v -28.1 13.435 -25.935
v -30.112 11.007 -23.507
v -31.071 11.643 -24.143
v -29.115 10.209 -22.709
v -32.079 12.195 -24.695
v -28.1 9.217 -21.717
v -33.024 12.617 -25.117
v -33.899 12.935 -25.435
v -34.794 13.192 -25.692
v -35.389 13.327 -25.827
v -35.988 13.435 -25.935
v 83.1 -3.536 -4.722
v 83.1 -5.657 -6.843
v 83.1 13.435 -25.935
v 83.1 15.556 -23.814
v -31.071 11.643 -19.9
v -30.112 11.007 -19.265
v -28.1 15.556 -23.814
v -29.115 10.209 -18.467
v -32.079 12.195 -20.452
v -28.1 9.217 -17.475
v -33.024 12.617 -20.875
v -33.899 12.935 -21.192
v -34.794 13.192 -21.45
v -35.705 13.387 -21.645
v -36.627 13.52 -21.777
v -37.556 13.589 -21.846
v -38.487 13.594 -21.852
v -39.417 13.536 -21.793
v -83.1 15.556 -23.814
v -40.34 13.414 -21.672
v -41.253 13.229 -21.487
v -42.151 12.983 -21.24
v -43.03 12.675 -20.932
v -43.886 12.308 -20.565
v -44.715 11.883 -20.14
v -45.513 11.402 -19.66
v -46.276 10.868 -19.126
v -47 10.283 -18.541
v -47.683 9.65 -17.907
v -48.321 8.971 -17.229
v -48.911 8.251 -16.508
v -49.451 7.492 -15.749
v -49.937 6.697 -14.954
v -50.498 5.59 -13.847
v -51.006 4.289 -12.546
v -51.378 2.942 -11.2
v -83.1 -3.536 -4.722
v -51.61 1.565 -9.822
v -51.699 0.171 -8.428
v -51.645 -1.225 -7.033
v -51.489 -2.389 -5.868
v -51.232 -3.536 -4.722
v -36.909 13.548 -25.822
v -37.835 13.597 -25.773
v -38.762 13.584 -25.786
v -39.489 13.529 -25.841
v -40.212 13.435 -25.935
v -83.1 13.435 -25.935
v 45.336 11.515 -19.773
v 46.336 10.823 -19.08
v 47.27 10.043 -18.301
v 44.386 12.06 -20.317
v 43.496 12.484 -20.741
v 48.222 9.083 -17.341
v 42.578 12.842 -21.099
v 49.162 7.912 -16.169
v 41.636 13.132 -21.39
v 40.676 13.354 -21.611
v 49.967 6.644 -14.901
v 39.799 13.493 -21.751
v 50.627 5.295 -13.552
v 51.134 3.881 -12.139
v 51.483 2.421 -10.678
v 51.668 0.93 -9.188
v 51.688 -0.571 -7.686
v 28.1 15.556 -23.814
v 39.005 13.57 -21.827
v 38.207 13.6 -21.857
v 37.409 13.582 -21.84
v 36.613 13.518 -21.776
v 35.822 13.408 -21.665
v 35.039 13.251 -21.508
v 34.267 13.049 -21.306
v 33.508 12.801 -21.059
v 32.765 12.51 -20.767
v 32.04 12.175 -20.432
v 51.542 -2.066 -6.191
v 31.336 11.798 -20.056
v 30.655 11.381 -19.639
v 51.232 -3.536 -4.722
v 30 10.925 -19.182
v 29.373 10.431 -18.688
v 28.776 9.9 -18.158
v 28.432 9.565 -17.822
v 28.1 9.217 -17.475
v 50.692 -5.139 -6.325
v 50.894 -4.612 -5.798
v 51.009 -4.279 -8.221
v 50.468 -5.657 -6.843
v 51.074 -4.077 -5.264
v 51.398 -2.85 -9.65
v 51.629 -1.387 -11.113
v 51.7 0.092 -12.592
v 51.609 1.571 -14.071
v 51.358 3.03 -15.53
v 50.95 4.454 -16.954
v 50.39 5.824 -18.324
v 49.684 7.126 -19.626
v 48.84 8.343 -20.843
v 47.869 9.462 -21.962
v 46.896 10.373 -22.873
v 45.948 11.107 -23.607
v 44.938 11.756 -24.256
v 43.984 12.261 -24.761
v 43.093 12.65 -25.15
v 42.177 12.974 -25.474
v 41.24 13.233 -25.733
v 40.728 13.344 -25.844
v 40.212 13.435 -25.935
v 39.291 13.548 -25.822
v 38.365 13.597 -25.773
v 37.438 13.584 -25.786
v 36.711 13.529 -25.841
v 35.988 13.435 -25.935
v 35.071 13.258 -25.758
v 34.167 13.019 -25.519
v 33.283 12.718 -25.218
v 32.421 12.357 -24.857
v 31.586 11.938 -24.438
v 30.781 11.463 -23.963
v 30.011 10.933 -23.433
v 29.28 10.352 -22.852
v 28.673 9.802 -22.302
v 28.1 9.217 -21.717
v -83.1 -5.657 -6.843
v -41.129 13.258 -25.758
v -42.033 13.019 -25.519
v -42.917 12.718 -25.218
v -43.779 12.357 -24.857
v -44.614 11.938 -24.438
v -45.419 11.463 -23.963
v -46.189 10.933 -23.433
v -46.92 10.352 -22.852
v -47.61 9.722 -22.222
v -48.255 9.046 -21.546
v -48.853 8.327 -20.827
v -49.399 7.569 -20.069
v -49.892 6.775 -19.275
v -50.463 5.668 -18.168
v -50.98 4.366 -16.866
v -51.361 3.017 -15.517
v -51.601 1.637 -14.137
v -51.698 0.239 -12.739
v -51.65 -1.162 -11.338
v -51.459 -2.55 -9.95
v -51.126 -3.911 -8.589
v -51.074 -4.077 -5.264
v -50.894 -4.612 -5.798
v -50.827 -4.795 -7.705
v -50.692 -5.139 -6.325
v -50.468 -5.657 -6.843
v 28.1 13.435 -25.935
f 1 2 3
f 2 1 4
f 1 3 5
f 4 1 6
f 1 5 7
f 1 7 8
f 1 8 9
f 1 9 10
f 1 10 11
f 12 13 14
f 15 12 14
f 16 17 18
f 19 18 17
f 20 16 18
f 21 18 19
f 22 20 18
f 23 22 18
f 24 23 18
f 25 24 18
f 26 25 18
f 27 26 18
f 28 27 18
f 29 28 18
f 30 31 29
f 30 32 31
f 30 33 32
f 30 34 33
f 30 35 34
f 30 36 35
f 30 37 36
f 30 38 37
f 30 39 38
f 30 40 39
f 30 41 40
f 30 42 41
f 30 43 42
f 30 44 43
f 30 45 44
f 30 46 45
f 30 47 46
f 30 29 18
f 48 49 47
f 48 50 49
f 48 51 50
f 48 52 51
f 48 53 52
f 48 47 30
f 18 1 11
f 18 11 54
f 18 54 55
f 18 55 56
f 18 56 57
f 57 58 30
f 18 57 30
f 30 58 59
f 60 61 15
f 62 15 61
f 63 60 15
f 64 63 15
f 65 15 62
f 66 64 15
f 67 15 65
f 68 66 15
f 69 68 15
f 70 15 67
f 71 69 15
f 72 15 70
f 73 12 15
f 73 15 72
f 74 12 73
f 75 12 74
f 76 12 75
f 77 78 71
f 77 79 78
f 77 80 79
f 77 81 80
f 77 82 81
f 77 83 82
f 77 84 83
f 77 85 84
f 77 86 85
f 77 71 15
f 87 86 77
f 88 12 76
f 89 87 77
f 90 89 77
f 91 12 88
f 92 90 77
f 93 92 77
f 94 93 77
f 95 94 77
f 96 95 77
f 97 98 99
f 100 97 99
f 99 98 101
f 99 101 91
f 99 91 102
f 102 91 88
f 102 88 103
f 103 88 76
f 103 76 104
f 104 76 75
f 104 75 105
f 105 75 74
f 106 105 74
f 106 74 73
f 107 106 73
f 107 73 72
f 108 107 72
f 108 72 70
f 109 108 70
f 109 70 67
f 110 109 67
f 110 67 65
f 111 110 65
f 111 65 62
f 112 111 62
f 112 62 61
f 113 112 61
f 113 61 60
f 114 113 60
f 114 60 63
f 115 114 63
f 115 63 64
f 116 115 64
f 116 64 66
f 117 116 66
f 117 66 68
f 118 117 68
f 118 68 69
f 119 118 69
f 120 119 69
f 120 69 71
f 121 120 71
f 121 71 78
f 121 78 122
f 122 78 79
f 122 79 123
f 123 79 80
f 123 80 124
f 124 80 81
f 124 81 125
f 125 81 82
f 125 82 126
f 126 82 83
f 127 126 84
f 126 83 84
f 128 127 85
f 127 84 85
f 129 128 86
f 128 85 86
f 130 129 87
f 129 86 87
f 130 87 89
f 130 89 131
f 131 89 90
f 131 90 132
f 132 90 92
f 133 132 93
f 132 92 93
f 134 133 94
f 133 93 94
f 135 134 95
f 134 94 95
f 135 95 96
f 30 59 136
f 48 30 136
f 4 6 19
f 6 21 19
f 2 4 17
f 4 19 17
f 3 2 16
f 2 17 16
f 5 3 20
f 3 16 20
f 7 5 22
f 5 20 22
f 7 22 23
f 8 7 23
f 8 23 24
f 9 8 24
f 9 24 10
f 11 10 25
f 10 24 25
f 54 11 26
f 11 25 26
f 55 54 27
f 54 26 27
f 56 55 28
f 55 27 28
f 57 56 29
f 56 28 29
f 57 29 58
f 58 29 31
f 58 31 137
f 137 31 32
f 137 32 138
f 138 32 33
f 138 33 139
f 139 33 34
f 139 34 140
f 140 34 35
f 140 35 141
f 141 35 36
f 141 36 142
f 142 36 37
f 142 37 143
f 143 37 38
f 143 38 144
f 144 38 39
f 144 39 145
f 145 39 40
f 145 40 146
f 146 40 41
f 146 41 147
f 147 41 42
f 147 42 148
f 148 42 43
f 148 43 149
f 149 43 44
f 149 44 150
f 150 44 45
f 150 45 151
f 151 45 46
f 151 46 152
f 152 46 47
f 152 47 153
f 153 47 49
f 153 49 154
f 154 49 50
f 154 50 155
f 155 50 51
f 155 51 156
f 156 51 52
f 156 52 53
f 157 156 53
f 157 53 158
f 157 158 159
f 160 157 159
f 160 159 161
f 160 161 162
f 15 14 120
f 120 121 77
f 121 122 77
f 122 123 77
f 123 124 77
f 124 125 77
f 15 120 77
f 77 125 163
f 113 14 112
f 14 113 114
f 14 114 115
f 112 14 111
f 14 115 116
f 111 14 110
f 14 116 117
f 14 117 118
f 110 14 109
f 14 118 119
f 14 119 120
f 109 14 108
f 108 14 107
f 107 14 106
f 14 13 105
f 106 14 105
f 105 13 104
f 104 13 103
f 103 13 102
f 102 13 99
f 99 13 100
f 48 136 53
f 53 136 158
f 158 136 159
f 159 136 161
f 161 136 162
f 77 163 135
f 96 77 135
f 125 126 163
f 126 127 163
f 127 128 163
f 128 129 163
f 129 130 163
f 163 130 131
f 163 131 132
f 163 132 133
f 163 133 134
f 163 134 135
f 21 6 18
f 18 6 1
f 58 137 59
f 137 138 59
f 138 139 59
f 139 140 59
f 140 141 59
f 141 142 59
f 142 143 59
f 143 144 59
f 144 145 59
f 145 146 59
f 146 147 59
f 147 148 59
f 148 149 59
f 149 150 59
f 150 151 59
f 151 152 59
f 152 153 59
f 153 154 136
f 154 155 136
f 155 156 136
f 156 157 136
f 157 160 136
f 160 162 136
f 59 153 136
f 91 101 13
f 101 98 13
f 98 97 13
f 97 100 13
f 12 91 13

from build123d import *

# Parameters (mm, degrees)
F4_W     = 10
F4_H     = 8
F5_DEPTH = 3
F3_R     = 13.6
F6_DEPTH = 26


with BuildPart() as f5:
    # F4 (on face) → F5 (new body)
    with BuildSketch(Plane(origin=(0, -6.25, -6.25), x_dir=(-1, 0, 0), z_dir=(0, 0.7071067812, 0.7071067812))):
        Polygon((38.1, -0.8388347648), (38.1, -8.8388347648), (28.1, -8.8388347648), (28.1, -27.8388347648), (83.1, -27.8388347648), (83.1, -0.8388347648), align=None)
        with Locations((33.1, -4.8388347648)):
            Rectangle(F4_W, F4_H)
    extrude(amount=F5_DEPTH)


with BuildPart() as f5b:
    # F4 (on face) → F5, piece 2 (new body)
    with BuildSketch(Plane(origin=(0, -6.25, -6.25), x_dir=(-1, 0, 0), z_dir=(0, 0.7071067812, 0.7071067812))):
        Polygon((-28.1, -27.8388347648), (-28.1, -8.8388347648), (-38.1, -8.8388347648), (-38.1, -0.8388347648), (-83.1, -0.8388347648), (-83.1, -27.8388347648), align=None)
        with Locations((-33.1, -4.8388347648)):
            Rectangle(F4_W, F4_H)
    extrude(amount=F5_DEPTH)


with BuildPart() as f6_tool:
    # F3 (on Top) → F6 (new body)
    with BuildSketch(Plane.XY):
        with Locations((-38.1, 0)):
            Circle(F3_R)
        with BuildLine():
            ThreePointArc((51.7, 0), (38.1, 13.6), (24.5, 0))
            ThreePointArc((24.5, 0), (38.1, -13.6), (51.7, 0))
        make_face()
    extrude(amount=-F6_DEPTH)


with BuildPart() as f5_1:
    add(f5.part)

    # F6: cut by f6_tool
    add(f6_tool.part, mode=Mode.SUBTRACT)


with BuildPart() as f5b_1:
    add(f5b.part)

    # F6: cut by f6_tool
    add(f6_tool.part, mode=Mode.SUBTRACT)


solid = Compound([f5_1.part, f5b_1.part])
